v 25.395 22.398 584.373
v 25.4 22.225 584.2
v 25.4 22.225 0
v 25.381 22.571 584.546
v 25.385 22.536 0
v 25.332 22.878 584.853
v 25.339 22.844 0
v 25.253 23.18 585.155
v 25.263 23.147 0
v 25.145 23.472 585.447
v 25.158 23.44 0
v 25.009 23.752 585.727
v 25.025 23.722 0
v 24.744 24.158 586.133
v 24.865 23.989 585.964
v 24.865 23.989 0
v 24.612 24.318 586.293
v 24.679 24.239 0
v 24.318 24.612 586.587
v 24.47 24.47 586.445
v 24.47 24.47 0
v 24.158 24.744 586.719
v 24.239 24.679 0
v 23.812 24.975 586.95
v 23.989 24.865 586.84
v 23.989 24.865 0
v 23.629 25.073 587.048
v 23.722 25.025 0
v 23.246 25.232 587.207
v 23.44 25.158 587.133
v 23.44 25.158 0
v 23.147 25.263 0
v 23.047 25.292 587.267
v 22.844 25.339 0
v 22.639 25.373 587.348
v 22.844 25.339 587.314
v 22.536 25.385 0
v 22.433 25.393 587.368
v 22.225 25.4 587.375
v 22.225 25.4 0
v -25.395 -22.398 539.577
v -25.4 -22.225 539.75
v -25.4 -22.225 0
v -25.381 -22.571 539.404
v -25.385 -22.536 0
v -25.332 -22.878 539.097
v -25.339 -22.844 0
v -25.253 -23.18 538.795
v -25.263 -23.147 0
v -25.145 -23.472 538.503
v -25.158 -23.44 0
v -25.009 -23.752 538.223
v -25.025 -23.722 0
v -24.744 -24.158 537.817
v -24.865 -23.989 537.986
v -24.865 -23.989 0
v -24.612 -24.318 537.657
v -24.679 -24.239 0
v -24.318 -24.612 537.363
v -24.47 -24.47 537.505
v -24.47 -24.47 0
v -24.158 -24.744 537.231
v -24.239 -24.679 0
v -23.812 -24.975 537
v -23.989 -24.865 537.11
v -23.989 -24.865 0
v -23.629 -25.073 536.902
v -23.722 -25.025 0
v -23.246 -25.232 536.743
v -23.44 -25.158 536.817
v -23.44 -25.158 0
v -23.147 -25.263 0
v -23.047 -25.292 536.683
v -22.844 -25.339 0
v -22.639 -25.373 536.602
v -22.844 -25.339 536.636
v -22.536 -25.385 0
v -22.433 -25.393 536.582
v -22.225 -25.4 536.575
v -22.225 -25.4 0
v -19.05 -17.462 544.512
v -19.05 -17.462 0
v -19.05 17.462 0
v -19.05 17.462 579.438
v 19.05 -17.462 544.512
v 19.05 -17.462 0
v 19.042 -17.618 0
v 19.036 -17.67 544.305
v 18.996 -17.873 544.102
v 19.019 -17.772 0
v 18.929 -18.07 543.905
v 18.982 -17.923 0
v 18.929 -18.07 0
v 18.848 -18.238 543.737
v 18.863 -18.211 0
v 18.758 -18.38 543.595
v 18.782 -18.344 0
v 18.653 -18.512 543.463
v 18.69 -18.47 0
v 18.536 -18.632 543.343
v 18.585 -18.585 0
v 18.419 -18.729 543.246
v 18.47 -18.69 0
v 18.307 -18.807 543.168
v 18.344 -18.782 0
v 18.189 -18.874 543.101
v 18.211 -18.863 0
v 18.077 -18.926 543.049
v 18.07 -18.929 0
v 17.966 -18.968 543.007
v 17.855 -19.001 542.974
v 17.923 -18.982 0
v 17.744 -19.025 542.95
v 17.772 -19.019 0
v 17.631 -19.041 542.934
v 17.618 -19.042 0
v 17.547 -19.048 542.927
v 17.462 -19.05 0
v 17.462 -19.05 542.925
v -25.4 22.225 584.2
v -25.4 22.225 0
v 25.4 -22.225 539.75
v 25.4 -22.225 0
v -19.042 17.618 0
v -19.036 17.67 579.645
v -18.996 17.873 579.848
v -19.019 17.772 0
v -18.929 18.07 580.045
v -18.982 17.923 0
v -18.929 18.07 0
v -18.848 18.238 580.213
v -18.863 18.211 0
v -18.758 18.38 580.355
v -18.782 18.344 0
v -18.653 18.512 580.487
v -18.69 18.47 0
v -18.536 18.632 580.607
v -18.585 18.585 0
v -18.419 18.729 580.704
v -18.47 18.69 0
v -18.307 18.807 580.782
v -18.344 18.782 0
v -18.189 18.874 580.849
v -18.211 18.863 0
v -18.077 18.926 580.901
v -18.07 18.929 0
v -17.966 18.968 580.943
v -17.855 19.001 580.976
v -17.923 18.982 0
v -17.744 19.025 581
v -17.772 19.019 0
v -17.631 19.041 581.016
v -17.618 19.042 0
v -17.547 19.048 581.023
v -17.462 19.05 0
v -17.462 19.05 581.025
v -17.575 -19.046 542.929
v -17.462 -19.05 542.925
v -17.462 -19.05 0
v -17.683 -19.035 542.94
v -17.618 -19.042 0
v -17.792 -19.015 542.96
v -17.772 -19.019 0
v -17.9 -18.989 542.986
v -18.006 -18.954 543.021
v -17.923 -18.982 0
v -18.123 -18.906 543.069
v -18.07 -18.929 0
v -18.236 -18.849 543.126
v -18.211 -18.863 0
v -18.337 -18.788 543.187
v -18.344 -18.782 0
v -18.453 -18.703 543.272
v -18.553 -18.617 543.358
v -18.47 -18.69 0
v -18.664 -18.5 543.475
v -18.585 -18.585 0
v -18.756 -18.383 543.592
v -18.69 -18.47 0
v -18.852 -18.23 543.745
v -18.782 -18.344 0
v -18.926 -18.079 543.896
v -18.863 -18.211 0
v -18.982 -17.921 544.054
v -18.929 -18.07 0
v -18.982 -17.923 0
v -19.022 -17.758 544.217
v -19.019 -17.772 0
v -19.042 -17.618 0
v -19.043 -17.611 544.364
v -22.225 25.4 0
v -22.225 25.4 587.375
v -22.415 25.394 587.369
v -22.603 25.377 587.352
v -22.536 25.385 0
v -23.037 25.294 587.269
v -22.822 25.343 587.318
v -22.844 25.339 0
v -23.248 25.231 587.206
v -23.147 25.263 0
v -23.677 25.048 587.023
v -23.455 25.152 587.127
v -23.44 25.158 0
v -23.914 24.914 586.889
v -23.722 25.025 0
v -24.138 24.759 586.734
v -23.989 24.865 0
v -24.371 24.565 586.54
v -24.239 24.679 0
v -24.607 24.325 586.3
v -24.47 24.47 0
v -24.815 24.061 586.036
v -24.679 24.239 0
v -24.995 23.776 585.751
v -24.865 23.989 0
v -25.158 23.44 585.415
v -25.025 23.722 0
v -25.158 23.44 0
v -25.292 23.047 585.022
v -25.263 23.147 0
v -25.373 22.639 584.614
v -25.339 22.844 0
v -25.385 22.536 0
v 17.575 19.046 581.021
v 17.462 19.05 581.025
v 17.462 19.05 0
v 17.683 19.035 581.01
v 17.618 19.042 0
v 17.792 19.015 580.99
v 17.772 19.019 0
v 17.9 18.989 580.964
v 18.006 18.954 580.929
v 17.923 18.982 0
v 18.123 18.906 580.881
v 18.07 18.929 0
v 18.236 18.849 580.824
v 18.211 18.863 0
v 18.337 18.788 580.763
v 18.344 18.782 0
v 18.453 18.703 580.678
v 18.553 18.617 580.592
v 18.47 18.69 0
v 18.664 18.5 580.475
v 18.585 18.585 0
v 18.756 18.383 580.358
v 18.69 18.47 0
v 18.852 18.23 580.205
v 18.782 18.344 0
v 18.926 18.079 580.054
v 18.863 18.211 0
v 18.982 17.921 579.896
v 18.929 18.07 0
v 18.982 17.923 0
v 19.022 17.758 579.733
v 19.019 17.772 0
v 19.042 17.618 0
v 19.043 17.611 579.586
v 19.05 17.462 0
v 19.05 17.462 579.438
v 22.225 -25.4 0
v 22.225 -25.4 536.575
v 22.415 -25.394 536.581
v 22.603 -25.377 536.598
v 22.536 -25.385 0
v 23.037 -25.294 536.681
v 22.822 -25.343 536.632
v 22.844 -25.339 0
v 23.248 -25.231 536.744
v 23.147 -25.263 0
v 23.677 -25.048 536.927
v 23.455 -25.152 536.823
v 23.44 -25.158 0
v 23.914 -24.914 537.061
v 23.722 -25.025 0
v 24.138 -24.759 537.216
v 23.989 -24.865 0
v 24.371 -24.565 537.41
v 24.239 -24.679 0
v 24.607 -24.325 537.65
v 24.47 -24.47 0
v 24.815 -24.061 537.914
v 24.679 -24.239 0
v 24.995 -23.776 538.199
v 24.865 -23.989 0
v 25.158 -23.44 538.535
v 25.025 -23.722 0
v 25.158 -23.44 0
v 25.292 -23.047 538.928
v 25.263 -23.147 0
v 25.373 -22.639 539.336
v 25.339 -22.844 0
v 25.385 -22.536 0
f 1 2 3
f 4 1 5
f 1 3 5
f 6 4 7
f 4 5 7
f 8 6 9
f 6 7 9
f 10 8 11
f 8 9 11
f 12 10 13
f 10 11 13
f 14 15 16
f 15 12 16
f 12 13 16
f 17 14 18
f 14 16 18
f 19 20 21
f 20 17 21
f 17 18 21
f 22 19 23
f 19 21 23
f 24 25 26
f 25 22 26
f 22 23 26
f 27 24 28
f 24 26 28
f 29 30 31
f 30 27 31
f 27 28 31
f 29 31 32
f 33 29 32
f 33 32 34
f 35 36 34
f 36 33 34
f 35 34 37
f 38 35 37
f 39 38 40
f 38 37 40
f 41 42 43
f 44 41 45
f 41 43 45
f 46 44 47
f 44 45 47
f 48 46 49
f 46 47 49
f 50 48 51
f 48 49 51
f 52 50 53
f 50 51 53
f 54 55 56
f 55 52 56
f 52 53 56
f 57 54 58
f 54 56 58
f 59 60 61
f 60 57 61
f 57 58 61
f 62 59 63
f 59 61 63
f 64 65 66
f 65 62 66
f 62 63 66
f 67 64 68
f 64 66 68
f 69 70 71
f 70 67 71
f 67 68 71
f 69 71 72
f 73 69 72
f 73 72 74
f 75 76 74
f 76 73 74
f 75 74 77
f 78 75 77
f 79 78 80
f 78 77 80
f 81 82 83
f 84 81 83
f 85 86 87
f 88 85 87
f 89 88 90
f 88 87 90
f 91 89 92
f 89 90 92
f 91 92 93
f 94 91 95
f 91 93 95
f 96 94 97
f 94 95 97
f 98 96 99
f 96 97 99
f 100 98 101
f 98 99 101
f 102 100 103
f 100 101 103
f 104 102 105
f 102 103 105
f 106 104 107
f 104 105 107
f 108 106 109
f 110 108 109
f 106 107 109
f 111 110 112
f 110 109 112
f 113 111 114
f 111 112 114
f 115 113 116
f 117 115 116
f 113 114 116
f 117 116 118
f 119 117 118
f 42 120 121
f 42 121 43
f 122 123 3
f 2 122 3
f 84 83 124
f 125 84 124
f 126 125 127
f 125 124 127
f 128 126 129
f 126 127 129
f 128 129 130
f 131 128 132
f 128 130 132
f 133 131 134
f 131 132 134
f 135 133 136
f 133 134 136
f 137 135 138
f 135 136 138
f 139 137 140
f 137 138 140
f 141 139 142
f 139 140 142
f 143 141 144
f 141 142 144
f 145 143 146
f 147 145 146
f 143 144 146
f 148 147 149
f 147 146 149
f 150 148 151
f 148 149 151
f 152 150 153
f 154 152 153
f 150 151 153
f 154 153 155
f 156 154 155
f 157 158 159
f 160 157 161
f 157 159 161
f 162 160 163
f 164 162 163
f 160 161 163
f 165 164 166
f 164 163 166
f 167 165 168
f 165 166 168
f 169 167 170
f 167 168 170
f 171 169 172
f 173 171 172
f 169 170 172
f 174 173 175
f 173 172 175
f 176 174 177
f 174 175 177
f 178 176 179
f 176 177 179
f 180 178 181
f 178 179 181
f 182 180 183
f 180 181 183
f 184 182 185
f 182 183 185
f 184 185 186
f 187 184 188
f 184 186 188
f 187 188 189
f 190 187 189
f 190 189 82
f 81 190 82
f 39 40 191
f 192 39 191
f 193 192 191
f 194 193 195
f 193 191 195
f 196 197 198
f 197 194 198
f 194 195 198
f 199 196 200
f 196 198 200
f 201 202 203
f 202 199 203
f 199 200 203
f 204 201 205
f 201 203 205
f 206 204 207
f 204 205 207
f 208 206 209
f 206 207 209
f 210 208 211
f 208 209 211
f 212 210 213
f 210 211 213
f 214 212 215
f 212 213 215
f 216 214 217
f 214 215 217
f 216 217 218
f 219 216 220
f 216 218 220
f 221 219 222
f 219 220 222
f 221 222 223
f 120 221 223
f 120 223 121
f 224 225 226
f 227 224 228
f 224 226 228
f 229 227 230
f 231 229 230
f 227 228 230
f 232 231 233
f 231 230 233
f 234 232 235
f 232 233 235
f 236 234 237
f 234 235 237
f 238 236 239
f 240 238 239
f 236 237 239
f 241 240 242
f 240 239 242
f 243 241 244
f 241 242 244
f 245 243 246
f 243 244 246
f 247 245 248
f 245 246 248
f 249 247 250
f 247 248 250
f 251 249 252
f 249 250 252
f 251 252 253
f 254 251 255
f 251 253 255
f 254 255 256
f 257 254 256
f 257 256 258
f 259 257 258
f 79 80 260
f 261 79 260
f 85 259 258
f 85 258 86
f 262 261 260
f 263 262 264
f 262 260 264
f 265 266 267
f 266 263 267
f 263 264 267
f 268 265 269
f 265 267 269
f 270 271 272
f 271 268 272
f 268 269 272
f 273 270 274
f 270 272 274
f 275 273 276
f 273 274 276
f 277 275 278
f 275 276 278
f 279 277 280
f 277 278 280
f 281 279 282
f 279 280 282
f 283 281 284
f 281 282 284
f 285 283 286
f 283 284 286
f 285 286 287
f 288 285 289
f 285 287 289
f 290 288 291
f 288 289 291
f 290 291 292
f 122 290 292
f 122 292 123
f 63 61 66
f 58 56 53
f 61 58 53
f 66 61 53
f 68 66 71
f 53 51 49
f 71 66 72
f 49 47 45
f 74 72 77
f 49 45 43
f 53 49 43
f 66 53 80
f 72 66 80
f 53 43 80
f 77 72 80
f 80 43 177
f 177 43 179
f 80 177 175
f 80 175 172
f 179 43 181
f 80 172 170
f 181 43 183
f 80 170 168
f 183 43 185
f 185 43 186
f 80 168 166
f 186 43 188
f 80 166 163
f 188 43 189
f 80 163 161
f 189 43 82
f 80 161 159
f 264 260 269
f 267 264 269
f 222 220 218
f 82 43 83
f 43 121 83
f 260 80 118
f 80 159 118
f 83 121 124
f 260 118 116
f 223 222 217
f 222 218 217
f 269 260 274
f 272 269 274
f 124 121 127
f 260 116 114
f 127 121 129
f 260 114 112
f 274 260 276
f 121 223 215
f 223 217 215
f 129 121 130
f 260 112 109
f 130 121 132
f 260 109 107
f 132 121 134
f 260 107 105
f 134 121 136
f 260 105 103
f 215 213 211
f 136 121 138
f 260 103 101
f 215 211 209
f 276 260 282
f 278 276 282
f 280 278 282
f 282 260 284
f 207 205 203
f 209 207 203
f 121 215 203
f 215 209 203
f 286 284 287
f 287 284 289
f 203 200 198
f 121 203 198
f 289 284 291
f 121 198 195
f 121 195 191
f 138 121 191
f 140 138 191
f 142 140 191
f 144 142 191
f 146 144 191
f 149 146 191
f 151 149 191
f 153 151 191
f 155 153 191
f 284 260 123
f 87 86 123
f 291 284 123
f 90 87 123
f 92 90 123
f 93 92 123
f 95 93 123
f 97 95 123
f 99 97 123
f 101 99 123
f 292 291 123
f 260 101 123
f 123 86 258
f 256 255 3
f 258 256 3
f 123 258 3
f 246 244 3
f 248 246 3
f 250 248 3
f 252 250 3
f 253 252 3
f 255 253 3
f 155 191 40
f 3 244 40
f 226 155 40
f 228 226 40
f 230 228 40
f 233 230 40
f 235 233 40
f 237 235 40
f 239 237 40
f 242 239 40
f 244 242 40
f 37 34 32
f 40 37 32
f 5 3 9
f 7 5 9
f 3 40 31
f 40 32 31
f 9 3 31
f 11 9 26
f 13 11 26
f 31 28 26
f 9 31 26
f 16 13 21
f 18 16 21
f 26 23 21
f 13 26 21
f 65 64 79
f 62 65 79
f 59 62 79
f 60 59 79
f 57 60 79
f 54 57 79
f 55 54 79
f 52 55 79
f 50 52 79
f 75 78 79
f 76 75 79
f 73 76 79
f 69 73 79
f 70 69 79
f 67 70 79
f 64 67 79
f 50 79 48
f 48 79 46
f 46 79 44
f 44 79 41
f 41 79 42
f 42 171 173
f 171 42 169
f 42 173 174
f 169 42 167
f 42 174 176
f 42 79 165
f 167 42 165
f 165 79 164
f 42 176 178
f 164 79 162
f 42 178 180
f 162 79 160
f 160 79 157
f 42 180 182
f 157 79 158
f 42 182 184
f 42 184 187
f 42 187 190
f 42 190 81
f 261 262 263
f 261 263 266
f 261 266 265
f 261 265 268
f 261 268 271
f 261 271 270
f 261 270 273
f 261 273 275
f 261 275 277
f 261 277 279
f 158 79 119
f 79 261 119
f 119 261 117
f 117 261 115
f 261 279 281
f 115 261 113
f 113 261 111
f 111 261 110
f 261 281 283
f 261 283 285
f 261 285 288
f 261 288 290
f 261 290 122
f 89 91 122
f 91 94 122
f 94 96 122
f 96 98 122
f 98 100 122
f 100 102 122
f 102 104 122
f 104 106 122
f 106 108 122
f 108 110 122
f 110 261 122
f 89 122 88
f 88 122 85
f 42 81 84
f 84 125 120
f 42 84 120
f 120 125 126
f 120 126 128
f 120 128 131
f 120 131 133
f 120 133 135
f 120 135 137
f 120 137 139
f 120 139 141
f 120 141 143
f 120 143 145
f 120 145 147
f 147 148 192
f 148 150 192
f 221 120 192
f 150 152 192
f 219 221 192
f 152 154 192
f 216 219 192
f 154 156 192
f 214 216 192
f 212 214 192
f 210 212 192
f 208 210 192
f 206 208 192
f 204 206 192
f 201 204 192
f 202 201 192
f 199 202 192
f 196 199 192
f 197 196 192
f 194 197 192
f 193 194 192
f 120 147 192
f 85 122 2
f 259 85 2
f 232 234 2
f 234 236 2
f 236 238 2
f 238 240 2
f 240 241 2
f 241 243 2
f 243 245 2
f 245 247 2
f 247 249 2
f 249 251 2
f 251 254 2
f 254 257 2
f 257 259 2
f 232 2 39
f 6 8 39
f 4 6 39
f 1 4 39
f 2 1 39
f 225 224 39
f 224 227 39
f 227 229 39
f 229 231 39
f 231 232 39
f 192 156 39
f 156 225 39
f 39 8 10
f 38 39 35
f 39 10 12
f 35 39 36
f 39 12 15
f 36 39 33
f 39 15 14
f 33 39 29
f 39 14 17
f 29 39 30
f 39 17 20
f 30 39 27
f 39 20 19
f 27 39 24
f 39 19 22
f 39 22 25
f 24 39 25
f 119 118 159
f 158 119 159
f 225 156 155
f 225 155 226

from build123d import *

# Parameters (mm, degrees)
F1_DEPTH = 587.375
F3_DEPTH = 50.801


with BuildPart() as f1:
    # F0 (on Top) → F1 (new body)
    with BuildSketch(Plane.XY):
        with BuildLine():
            Line((22.225, 25.4), (-22.225, 25.4))
            ThreePointArc((-22.225, 25.4), (-24.470064, 24.470064), (-25.4, 22.225))
            Line((-25.4, 22.225), (-25.4, -22.225))
            ThreePointArc((-25.4, -22.225), (-24.470064, -24.470064), (-22.225, -25.4))
            Line((-22.225, -25.4), (22.225, -25.4))
            ThreePointArc((22.225, -25.4), (24.470064, -24.470064), (25.4, -22.225))
            Line((25.4, -22.225), (25.4, 22.225))
            ThreePointArc((25.4, 22.225), (24.470064, 24.470064), (22.225, 25.4))
        make_face()
        with BuildLine():
            ThreePointArc((-19.05, 17.4625), (-18.585032, 18.585032), (-17.4625, 19.05))
            Line((-17.4625, 19.05), (17.4625, 19.05))
            ThreePointArc((17.4625, 19.05), (18.585032, 18.585032), (19.05, 17.4625))
            Line((19.05, 17.4625), (19.05, -17.4625))
            ThreePointArc((19.05, -17.4625), (18.585032, -18.585032), (17.4625, -19.05))
            Line((17.4625, -19.05), (-17.4625, -19.05))
            ThreePointArc((-17.4625, -19.05), (-18.585032, -18.585032), (-19.05, -17.4625))
            Line((-19.05, -17.4625), (-19.05, 17.4625))
        make_face(mode=Mode.SUBTRACT)
    extrude(amount=F1_DEPTH)

    # F2 (on face) → F3 (cut, through all)
    with BuildSketch(Plane.YZ.offset(25.4)):
        Polygon((-25.4, 536.575), (25.4, 587.375), (-25.4, 587.375), align=None)
    extrude(amount=-F3_DEPTH, mode=Mode.SUBTRACT)


solid = f1.part
